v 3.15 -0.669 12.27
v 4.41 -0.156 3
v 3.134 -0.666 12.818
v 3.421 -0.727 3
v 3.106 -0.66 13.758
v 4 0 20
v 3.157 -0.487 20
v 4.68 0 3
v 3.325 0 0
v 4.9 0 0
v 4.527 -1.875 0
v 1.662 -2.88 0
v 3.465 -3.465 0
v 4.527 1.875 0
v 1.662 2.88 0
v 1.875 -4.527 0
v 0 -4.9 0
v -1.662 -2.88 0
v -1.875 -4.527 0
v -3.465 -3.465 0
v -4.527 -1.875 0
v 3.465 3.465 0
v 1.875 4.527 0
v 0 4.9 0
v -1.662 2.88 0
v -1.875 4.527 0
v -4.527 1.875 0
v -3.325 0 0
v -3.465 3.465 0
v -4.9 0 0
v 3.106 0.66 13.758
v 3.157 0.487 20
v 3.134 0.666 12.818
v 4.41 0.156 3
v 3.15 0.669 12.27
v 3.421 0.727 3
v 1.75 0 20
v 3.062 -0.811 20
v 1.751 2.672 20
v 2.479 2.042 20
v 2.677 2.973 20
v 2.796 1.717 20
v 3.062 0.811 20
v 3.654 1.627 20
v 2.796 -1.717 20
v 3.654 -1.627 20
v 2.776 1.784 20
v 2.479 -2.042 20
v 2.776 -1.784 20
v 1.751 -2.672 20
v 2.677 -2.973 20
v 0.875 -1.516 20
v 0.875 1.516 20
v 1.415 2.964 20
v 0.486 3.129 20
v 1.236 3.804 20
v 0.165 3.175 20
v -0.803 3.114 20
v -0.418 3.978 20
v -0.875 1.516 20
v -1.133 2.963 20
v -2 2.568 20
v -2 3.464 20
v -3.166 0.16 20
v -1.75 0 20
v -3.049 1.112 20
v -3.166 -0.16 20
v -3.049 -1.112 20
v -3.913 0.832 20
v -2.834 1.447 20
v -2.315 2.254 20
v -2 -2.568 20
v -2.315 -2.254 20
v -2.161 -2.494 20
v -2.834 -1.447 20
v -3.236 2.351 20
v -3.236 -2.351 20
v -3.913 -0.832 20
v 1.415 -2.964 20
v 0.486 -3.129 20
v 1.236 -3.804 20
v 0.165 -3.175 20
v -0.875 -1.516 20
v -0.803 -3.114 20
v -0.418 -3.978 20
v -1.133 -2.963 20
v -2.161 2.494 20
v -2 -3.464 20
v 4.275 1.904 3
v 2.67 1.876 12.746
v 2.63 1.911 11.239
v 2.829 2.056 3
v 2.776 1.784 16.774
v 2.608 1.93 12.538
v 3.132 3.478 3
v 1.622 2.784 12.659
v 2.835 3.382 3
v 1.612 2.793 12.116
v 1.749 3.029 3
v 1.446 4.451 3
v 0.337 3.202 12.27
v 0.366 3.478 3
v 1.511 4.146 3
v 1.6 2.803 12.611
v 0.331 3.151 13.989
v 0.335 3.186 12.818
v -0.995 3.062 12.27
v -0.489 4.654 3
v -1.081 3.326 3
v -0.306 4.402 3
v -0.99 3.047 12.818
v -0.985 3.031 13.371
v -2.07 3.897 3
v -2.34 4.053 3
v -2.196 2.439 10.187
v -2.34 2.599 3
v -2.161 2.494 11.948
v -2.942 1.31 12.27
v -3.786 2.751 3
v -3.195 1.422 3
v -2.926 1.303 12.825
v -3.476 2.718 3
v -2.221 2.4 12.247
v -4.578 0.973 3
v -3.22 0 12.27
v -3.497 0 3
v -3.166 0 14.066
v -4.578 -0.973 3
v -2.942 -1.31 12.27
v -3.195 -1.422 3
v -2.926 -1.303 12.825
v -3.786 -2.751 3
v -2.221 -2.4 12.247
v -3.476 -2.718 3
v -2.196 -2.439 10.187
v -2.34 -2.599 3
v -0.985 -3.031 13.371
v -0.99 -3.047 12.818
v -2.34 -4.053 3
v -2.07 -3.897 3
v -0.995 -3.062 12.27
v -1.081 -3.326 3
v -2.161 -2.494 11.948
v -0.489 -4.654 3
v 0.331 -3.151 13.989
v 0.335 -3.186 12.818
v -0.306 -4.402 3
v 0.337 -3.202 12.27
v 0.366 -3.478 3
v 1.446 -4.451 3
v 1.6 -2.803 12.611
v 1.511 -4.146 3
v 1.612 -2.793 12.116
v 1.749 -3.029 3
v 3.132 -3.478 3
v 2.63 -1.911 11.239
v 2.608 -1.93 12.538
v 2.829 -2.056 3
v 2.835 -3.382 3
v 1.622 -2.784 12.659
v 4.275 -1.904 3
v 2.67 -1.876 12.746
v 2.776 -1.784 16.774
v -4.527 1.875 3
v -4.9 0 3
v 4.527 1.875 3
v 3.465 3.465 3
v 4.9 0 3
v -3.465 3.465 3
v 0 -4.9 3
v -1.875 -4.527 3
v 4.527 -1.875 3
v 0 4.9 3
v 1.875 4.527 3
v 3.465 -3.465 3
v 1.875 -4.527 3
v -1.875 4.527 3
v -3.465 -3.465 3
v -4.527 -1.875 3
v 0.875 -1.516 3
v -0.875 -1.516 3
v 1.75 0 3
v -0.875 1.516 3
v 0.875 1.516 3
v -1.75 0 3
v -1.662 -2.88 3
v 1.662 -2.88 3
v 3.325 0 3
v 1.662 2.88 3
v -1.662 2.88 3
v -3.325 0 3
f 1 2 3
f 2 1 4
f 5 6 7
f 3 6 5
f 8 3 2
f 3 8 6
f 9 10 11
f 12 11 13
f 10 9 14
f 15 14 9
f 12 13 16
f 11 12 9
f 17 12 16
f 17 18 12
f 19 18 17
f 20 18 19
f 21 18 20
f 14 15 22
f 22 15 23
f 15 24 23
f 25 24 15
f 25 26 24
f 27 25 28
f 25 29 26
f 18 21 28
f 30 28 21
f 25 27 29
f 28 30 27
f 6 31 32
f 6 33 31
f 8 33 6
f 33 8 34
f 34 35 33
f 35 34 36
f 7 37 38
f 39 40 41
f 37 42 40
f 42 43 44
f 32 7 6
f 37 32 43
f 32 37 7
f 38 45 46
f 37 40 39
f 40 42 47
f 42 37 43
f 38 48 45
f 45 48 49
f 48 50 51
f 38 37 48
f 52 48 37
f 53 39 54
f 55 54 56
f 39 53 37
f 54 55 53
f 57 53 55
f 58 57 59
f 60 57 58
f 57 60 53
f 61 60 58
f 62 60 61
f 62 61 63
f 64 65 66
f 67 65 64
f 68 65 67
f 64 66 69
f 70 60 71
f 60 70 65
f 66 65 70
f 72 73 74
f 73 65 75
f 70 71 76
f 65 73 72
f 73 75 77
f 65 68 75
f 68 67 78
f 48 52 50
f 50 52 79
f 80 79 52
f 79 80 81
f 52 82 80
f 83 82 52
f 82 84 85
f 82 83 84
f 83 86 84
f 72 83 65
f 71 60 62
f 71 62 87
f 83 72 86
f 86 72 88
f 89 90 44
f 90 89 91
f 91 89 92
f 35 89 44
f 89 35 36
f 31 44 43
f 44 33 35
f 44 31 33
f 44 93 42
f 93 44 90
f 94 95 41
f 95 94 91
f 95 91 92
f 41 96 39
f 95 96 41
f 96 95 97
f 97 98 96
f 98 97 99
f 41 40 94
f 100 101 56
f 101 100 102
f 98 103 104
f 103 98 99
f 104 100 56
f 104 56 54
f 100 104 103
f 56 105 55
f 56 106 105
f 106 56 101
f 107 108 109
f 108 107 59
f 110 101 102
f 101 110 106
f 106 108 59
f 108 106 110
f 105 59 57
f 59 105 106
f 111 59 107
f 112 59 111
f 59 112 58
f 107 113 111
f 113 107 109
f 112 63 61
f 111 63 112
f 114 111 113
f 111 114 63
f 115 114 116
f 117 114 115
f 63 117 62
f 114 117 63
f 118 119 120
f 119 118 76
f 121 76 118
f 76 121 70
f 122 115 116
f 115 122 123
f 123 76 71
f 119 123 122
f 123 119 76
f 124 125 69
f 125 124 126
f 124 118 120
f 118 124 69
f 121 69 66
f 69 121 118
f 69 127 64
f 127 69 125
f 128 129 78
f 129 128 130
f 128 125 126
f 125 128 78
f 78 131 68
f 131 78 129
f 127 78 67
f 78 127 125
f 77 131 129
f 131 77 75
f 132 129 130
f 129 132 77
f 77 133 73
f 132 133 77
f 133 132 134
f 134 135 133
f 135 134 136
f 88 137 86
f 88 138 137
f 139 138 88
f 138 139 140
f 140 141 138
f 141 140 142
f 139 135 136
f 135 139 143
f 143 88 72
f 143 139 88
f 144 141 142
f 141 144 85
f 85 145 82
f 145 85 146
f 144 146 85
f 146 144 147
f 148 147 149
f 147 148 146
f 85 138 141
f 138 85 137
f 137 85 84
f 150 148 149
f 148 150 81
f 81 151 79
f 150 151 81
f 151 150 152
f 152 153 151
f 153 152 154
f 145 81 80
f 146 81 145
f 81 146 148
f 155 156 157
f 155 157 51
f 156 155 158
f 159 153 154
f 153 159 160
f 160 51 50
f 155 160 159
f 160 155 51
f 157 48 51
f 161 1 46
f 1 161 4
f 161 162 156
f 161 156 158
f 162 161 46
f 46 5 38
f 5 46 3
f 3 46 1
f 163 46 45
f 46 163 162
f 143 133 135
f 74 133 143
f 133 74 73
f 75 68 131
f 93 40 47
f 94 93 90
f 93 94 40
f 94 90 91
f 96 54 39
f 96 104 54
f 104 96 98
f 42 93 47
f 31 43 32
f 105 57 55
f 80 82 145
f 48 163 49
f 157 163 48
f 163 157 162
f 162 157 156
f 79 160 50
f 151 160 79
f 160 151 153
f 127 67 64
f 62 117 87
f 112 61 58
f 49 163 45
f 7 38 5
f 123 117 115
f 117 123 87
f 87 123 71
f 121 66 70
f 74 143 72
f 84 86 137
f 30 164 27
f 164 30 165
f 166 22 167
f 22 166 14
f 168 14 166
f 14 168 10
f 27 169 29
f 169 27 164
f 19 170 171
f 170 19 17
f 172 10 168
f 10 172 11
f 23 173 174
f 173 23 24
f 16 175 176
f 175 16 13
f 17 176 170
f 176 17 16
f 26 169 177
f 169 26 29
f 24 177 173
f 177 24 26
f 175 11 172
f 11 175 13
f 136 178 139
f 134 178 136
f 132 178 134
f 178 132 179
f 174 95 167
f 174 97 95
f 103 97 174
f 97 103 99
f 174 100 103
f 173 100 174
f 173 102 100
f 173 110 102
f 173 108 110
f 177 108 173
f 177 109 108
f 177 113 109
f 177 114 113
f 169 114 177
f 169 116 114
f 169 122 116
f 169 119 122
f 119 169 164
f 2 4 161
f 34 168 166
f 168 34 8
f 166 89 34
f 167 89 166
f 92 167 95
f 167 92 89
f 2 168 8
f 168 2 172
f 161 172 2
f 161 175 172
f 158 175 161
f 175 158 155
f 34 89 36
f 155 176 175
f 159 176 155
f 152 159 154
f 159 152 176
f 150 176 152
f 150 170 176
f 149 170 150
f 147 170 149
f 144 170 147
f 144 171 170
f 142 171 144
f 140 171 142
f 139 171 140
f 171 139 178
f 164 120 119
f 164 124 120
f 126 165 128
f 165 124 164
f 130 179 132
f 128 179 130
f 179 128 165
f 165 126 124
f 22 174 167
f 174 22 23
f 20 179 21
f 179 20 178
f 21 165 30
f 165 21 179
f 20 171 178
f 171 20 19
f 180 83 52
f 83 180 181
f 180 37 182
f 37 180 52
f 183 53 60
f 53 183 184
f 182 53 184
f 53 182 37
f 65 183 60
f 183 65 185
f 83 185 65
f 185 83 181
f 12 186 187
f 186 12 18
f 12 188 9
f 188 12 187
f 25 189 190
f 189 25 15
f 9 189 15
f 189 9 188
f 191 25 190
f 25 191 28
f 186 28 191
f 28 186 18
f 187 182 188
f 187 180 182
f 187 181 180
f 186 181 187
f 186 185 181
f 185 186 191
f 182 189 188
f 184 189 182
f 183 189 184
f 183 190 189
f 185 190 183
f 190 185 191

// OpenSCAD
knoobHeight = 20;
rodDia = 3.5;

difference(){
union(){
for(i=[0:24:360])
    rotate([0,0,i]) translate([rodDia*0.8,0,0]) cylinder(r1=2, r2=1.2, h=knoobHeight, $fn = 3);

cylinder(r=rodDia-0.2,h=knoobHeight);
cylinder(r=rodDia*1.4,h=3);
}
cylinder(r=rodDia/2,h=knoobHeight);
cylinder(r=rodDia*0.95,h=3, $fn=6);
}
